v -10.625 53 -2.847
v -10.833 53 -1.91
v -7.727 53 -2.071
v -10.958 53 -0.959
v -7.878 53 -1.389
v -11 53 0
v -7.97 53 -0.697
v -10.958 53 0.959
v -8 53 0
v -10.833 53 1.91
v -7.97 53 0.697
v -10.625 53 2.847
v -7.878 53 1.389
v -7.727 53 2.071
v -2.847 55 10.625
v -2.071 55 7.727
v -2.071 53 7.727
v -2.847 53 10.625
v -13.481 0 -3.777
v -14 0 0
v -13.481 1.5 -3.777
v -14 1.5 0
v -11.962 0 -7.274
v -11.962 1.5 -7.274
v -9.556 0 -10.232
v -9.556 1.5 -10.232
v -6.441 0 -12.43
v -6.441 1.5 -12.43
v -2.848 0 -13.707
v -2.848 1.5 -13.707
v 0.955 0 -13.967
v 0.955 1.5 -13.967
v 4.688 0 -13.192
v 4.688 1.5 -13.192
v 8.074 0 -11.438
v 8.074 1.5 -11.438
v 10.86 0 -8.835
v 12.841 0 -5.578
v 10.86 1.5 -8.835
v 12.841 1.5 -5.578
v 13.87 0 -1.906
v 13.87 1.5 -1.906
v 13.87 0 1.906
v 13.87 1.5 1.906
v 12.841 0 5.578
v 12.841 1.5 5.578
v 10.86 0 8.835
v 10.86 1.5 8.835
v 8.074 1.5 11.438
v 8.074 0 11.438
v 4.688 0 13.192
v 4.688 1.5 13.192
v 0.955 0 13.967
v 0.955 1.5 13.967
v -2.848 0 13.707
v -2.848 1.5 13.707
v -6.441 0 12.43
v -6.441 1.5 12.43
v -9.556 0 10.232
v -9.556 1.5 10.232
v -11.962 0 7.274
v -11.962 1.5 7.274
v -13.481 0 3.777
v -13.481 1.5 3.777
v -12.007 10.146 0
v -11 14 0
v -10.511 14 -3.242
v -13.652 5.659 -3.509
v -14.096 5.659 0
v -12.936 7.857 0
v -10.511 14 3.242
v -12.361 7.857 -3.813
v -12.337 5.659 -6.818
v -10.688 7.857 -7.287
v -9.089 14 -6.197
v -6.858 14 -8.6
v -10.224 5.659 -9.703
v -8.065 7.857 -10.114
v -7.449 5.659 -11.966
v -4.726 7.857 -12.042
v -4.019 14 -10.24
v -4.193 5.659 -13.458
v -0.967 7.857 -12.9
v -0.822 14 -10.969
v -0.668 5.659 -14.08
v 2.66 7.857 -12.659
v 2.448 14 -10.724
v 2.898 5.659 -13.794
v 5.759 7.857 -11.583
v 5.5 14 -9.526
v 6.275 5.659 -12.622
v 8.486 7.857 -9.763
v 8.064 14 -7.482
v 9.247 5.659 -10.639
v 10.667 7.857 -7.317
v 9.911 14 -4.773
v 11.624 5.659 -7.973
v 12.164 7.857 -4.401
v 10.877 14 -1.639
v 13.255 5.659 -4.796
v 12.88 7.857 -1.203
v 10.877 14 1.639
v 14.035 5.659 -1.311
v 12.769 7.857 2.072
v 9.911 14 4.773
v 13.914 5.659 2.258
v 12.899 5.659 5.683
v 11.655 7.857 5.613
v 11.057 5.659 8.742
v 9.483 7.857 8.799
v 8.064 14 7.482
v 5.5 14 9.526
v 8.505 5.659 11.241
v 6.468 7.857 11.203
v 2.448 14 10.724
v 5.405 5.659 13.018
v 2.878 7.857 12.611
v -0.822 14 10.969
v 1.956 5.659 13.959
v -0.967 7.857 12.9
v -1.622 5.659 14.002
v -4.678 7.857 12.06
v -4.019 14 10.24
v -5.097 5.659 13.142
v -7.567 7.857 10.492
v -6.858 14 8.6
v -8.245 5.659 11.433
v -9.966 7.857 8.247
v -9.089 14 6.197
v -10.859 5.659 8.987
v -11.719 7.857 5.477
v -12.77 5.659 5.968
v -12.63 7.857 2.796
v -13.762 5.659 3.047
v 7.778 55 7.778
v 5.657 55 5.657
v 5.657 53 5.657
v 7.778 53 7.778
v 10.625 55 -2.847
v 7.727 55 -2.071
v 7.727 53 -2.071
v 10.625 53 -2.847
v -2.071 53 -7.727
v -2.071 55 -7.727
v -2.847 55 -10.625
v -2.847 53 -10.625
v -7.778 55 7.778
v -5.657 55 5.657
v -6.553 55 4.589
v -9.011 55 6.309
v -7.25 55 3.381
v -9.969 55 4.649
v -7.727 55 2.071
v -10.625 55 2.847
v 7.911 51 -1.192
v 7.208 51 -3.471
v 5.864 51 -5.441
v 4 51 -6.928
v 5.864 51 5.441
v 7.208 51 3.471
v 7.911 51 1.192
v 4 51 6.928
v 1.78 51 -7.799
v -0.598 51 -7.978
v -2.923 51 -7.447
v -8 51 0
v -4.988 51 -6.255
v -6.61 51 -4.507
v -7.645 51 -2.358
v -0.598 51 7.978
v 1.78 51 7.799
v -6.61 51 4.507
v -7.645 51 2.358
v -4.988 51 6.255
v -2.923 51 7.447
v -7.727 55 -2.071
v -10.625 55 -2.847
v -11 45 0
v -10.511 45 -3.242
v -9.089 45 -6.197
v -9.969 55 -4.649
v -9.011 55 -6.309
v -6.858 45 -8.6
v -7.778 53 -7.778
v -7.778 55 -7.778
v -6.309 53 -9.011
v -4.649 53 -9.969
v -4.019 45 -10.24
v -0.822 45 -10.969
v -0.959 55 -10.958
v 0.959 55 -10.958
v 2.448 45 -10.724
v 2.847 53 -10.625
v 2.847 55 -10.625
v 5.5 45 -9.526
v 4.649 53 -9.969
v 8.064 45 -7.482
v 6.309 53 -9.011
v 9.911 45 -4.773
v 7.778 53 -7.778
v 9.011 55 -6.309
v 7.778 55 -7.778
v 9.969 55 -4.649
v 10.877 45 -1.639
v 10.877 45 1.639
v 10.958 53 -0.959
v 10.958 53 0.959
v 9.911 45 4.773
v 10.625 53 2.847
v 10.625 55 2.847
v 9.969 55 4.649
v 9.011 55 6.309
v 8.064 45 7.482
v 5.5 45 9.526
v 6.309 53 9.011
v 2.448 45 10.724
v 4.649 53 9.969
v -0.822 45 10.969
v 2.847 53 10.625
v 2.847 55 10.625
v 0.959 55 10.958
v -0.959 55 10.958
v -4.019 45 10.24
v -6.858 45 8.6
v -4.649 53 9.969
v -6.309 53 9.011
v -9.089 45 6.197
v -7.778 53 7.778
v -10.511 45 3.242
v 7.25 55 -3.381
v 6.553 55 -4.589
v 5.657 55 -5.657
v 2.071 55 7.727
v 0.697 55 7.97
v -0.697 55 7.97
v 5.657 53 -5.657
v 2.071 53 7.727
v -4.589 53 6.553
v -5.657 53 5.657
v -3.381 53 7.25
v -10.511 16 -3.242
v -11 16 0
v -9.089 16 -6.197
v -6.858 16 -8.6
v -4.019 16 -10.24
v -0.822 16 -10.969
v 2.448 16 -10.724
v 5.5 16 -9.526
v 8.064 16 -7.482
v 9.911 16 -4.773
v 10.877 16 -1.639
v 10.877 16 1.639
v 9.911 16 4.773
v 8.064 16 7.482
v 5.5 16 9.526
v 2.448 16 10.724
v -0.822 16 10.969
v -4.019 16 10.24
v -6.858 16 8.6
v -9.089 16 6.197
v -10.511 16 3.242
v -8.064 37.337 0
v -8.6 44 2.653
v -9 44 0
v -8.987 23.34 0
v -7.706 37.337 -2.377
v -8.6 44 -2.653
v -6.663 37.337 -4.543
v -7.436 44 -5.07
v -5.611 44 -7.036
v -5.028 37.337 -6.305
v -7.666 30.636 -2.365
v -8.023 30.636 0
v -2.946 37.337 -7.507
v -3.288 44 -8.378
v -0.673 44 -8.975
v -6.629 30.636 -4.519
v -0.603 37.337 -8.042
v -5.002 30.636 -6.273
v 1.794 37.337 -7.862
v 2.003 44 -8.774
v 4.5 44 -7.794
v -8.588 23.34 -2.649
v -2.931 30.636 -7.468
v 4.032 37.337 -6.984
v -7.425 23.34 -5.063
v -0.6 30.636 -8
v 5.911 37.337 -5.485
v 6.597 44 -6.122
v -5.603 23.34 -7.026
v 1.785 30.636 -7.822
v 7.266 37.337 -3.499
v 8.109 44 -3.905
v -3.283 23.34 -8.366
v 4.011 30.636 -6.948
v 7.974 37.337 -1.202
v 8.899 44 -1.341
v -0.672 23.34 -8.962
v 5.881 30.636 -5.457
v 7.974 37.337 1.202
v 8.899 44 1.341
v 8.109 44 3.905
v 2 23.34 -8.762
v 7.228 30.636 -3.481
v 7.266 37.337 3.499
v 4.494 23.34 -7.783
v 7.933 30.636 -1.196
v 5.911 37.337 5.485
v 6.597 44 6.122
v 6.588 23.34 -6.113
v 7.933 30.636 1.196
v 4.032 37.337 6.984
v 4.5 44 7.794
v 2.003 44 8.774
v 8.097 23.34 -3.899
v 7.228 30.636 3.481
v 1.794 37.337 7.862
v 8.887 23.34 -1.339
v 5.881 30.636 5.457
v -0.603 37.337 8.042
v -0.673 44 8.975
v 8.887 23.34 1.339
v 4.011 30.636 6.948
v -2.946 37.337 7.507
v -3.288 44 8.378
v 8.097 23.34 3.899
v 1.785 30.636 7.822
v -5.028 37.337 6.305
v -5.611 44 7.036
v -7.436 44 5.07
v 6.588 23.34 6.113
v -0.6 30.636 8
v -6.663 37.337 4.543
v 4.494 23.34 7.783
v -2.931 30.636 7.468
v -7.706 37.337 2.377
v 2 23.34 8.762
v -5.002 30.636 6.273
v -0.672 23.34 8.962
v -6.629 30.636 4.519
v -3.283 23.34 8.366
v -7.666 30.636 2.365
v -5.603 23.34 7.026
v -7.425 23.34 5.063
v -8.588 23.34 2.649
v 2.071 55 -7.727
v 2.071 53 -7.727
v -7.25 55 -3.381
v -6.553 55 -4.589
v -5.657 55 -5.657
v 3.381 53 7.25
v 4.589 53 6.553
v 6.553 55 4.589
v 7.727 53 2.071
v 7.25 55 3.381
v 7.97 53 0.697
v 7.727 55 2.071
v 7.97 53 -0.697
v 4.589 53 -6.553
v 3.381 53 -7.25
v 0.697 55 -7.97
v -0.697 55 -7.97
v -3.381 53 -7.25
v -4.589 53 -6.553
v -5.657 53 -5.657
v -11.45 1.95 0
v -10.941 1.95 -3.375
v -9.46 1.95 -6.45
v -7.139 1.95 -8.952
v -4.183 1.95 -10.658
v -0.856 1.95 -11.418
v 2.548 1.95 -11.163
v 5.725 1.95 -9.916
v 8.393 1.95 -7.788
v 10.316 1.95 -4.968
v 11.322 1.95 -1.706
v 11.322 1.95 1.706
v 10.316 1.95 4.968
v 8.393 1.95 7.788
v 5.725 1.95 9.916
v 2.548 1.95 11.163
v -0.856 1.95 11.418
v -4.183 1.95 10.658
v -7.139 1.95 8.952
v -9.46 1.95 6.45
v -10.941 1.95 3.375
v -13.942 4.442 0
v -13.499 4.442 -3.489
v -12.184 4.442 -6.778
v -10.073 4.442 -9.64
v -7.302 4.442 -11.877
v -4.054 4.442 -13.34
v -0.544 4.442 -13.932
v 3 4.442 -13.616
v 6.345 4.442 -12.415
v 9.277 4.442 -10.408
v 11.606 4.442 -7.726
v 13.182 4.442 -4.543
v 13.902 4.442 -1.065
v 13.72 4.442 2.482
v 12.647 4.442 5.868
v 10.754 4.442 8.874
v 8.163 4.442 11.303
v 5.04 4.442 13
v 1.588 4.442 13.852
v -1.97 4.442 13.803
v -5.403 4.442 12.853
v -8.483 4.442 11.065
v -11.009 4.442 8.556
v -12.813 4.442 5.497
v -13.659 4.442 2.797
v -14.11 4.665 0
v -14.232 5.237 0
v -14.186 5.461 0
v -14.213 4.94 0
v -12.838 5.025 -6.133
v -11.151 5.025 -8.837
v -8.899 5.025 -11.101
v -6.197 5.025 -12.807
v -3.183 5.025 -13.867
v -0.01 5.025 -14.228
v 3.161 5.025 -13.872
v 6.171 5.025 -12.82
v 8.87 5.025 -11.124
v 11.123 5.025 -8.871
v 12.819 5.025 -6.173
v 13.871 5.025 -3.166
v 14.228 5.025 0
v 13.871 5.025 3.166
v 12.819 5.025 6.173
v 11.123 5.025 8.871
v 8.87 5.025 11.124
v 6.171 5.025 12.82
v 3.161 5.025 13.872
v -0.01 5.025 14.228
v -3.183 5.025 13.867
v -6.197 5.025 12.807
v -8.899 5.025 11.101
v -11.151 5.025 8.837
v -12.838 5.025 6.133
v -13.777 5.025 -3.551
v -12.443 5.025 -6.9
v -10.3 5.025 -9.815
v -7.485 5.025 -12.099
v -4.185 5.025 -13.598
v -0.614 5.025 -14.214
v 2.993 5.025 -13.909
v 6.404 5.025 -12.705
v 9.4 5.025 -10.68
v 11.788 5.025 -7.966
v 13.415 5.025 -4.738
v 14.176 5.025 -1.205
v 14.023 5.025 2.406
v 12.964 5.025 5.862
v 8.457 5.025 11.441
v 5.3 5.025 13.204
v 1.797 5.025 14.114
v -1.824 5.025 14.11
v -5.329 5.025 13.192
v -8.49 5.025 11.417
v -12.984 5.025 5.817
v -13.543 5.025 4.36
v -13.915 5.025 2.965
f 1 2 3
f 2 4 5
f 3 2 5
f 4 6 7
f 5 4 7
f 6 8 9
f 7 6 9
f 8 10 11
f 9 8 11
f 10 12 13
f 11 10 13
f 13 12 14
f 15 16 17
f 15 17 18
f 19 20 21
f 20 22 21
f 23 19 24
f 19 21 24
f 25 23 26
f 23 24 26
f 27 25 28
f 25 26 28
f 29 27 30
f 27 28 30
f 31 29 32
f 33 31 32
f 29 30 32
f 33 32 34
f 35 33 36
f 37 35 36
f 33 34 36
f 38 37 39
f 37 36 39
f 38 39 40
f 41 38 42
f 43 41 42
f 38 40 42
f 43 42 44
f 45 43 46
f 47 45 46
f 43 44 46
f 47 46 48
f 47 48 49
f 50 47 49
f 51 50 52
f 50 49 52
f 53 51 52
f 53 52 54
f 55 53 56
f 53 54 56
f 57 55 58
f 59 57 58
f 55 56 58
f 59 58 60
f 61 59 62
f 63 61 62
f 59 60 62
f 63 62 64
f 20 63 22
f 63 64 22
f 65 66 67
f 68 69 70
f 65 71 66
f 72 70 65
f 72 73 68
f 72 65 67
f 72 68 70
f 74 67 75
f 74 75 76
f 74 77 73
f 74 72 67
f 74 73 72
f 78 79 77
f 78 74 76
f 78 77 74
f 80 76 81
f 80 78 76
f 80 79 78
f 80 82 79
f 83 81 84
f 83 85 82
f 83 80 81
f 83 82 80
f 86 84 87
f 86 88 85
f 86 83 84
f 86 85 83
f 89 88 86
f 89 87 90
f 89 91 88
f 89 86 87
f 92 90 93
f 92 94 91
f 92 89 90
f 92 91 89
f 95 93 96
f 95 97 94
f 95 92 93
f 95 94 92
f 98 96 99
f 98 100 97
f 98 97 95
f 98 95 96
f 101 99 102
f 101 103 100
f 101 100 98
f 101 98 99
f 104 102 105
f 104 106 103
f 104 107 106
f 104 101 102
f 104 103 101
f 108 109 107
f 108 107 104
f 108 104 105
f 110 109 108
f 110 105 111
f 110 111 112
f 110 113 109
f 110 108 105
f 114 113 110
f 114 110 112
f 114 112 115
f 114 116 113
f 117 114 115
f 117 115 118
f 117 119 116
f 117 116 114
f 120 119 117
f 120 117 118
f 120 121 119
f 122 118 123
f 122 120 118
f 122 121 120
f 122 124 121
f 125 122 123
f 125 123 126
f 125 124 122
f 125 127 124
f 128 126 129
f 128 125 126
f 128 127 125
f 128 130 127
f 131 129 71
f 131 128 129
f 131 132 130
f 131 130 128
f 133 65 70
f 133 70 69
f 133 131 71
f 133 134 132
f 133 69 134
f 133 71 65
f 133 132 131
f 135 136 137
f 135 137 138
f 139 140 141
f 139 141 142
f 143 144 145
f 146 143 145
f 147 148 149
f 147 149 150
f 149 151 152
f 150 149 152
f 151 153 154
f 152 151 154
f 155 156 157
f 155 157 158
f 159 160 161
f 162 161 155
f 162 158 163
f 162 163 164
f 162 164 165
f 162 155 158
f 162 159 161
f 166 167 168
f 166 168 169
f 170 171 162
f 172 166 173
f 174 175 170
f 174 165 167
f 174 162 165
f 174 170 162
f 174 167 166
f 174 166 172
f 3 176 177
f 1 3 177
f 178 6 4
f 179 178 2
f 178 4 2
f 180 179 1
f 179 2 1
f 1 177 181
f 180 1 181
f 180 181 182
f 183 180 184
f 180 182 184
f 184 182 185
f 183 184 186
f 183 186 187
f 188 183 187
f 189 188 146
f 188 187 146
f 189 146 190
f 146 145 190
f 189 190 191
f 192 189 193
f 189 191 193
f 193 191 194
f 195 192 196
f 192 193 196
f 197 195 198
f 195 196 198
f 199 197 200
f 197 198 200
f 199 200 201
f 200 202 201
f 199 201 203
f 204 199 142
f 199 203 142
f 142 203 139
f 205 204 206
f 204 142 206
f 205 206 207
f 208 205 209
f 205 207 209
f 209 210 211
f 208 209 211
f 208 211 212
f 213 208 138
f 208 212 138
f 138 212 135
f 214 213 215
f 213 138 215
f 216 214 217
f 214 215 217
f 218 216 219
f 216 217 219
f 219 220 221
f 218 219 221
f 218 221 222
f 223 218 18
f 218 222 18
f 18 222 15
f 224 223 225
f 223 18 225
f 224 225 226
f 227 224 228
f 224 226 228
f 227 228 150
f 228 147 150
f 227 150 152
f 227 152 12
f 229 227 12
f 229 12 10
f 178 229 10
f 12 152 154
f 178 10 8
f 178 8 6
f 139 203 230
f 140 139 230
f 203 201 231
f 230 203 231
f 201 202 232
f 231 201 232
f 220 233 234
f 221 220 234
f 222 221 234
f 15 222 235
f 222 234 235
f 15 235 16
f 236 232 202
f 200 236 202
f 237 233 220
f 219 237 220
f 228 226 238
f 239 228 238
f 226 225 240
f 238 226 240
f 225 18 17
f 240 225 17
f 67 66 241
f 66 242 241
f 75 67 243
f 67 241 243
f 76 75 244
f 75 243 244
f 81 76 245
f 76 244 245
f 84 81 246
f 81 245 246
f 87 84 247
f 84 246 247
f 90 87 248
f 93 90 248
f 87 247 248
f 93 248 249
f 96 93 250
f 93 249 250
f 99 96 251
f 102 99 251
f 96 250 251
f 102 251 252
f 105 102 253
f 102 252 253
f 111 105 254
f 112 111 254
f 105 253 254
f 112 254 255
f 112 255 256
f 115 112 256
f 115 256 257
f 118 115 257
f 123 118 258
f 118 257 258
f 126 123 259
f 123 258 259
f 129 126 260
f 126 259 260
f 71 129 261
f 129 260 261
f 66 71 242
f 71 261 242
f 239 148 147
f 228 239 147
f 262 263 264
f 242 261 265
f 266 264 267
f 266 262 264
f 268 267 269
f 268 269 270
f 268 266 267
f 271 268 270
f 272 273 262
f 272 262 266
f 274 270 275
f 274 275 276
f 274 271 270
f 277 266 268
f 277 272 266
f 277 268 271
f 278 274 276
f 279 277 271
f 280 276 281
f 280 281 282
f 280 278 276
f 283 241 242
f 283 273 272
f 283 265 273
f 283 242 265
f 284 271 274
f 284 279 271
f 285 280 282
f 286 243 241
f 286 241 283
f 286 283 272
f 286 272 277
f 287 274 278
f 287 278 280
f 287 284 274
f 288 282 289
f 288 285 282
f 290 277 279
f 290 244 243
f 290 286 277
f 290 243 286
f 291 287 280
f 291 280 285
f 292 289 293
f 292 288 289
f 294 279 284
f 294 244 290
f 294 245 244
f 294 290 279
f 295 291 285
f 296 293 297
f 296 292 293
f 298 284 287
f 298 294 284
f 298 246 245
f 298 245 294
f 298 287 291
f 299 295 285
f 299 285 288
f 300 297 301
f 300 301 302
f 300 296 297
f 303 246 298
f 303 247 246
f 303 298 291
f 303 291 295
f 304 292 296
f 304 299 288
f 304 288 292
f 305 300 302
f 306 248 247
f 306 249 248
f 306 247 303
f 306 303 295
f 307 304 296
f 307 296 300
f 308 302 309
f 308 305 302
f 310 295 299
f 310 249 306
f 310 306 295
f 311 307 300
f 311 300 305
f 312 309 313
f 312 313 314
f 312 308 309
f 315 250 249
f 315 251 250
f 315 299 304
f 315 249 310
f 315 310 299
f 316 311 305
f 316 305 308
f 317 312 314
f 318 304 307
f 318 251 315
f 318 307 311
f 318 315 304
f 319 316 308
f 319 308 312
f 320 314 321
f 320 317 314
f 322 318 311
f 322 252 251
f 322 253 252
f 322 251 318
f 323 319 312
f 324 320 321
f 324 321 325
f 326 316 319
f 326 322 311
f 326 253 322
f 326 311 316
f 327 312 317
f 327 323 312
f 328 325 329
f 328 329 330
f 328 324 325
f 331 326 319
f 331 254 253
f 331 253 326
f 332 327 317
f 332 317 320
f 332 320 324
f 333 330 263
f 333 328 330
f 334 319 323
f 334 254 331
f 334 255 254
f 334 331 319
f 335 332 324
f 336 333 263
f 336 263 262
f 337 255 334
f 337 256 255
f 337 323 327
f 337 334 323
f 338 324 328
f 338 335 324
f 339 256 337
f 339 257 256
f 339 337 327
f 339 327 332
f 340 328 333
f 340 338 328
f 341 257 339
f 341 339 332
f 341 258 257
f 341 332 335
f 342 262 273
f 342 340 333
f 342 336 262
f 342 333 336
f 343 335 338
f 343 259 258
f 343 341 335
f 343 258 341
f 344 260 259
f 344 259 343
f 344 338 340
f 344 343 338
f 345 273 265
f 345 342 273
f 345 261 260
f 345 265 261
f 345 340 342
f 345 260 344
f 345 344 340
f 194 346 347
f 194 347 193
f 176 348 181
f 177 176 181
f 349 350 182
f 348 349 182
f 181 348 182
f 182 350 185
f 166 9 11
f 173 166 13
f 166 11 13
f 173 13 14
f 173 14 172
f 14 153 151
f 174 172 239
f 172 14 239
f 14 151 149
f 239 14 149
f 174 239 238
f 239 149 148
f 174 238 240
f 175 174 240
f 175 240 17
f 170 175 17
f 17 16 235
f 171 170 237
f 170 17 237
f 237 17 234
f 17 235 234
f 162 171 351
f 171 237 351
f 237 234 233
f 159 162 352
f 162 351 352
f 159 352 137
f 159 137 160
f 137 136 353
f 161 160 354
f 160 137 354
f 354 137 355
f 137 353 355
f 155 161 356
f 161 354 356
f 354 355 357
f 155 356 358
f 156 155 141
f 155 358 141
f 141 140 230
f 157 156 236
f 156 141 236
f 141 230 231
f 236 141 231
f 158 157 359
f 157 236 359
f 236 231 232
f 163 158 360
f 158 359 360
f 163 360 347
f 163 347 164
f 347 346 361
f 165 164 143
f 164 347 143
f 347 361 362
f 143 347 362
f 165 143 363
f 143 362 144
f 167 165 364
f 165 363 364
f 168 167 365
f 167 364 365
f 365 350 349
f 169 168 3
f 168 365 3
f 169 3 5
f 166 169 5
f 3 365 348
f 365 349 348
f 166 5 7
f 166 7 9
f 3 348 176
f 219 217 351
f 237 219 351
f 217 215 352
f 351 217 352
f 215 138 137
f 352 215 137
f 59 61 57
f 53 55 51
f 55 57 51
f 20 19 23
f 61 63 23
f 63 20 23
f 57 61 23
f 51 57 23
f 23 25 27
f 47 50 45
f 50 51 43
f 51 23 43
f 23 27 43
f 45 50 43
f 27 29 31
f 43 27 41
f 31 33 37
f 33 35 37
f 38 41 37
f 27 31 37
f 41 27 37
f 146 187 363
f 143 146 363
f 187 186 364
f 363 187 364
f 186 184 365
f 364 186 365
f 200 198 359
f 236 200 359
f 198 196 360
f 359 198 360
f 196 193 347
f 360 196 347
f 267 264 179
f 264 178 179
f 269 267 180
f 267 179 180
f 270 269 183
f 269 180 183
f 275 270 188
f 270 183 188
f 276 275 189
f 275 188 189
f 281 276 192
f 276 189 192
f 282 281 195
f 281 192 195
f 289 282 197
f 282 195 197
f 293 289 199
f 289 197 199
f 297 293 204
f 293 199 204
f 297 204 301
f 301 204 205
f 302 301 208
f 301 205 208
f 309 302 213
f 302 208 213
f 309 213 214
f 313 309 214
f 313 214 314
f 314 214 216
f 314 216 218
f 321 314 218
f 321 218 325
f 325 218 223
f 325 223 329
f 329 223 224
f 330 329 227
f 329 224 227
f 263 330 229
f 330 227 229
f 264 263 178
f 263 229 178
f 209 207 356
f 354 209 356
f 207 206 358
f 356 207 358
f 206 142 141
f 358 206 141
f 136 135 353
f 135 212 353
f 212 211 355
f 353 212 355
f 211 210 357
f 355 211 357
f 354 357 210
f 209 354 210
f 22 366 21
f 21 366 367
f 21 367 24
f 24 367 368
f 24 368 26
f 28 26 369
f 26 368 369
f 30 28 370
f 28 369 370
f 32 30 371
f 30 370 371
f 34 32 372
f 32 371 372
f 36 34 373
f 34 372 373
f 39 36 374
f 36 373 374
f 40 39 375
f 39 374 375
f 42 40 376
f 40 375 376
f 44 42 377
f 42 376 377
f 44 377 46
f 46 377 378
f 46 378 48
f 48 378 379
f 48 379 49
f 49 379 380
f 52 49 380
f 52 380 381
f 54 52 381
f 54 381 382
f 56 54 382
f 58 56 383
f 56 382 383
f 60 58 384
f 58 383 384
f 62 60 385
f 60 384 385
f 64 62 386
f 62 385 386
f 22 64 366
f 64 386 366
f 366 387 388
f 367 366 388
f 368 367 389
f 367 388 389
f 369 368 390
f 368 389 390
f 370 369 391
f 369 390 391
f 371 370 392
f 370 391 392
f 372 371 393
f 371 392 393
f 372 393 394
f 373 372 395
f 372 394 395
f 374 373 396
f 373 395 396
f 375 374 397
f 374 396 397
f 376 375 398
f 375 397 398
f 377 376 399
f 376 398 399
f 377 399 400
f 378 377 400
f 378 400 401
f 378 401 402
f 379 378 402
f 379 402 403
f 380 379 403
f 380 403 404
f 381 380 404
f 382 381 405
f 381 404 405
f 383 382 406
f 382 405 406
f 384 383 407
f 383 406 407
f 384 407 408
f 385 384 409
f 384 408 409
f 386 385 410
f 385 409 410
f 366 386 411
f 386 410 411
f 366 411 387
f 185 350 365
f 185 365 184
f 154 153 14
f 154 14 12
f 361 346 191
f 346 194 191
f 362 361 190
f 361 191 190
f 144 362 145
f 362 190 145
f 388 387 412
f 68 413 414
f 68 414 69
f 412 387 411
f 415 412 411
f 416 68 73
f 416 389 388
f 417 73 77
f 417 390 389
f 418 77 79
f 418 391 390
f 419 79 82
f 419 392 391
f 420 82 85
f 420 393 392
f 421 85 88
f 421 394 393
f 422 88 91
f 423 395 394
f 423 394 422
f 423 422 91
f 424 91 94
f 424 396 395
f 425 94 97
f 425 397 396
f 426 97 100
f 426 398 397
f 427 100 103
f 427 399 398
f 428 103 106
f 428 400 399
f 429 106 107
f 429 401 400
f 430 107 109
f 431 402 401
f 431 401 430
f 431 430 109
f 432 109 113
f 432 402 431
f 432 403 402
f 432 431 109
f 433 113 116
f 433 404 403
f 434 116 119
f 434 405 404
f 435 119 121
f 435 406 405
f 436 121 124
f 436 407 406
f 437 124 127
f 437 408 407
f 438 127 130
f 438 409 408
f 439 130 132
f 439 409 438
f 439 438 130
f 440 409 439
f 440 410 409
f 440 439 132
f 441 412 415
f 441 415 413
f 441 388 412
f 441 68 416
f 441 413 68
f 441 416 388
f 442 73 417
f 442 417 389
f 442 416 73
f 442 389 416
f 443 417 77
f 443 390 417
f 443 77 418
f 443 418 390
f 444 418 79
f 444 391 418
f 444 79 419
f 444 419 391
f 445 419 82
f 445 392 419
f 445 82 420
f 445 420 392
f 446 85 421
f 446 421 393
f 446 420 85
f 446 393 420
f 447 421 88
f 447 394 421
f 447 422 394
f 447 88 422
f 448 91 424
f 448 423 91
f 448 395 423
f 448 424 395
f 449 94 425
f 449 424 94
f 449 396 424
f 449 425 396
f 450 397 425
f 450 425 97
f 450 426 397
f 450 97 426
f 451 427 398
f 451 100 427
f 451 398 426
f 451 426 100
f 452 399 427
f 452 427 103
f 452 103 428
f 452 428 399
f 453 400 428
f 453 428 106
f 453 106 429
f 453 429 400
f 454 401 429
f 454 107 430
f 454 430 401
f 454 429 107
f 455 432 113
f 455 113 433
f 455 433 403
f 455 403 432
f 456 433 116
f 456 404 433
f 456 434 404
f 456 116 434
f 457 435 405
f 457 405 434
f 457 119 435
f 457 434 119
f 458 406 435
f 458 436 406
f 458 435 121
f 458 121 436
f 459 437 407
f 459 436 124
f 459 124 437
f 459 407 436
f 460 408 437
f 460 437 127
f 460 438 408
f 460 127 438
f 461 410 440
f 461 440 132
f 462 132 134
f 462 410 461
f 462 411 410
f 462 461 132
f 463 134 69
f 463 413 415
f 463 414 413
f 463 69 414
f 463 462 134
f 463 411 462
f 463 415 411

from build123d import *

# Parameters (mm, degrees)
FILLET1_R          = 1
SKETCH2_R          = 8
CUT_EXTRUDE1_DEPTH = 4
SKETCH3_W          = 3
SKETCH3_H          = 2
CUT_REVOLVE1_ANGLE = 30
CIRPATTERN1_COUNT  = 6


with BuildPart() as part:
    # Sketch1 → Revolve1 (revolve)
    with BuildSketch(Plane.XY, mode=Mode.PRIVATE) as revolve1_sk:
        with BuildLine():
            Line((0, 0), (14, 0))
            Line((14, 0), (14, 1.5))
            Line((14, 1.5), (11.449688693, 1.949688693))
            Line((11.449688693, 1.949688693), (14.5, 5))
            add(Edge.make_bspline(
                [(11, 14), (11.868897118, 9.149631339), (14.5, 5)],
                knots=[0, 0, 0, 1, 1, 1], degree=2))
            Line((11, 14), (11, 16))
            add(Edge.make_bspline(
                [(9, 44), (6.119153374, 30.160071278), (11, 16)],
                knots=[0, 0, 0, 1, 1, 1], degree=2))
            Line((9, 44), (11, 45))
            Line((11, 45), (11, 55))
            Line((11, 55), (0, 55))
            Line((0, 55), (0, 0))
        make_face()
    revolve(revolve1_sk.sketch.rotate(Axis((0, 55, 0), (0, -1, 0)), 180), axis=Axis((0, 55, 0), (0, -1, 0)))

    # Fillet1
    fillet1_edges = [part.edges().sort_by_distance(p)[0] for p in [
        (14.5, 5, 0),
    ]]
    fillet(fillet1_edges, radius=FILLET1_R)

    # Sketch2 → Cut-Extrude1 (cut)
    with BuildSketch(Plane(origin=(0, 55, 0), x_dir=(1, 0, 0), z_dir=(0, 1, 0))):
        with Locations(Location((0, 0, 0), (0, 0, 180))):
            Circle(SKETCH2_R)
    extrude(amount=-CUT_EXTRUDE1_DEPTH, mode=Mode.SUBTRACT)

    # Sketch3 → Cut-Revolve1 (revolve, symmetric, cut)
    with BuildSketch(Plane.XY) as cut_revolve1_sk:
        with Locations((9.5, 54)):
            Rectangle(SKETCH3_W, SKETCH3_H)
    cut_revolve1 = revolve(axis=Axis((0, 0, 0), (0, 1, 0)), revolution_arc=CUT_REVOLVE1_ANGLE / 2, mode=Mode.SUBTRACT)
    cut_revolve1 = cut_revolve1 + revolve(cut_revolve1_sk.sketch, axis=Axis((0, 0, 0), (0, -1, 0)), revolution_arc=CUT_REVOLVE1_ANGLE / 2, mode=Mode.SUBTRACT)

    # CirPattern1: Cut-Revolve1 ×6 about axis
    cirpattern1_axis = Axis((0, 0, 0), (0, 1, 0))
    for i in range(1, CIRPATTERN1_COUNT):
        add(cut_revolve1.rotate(cirpattern1_axis, i * 360 / CIRPATTERN1_COUNT), mode=Mode.SUBTRACT)


solid = part.part
